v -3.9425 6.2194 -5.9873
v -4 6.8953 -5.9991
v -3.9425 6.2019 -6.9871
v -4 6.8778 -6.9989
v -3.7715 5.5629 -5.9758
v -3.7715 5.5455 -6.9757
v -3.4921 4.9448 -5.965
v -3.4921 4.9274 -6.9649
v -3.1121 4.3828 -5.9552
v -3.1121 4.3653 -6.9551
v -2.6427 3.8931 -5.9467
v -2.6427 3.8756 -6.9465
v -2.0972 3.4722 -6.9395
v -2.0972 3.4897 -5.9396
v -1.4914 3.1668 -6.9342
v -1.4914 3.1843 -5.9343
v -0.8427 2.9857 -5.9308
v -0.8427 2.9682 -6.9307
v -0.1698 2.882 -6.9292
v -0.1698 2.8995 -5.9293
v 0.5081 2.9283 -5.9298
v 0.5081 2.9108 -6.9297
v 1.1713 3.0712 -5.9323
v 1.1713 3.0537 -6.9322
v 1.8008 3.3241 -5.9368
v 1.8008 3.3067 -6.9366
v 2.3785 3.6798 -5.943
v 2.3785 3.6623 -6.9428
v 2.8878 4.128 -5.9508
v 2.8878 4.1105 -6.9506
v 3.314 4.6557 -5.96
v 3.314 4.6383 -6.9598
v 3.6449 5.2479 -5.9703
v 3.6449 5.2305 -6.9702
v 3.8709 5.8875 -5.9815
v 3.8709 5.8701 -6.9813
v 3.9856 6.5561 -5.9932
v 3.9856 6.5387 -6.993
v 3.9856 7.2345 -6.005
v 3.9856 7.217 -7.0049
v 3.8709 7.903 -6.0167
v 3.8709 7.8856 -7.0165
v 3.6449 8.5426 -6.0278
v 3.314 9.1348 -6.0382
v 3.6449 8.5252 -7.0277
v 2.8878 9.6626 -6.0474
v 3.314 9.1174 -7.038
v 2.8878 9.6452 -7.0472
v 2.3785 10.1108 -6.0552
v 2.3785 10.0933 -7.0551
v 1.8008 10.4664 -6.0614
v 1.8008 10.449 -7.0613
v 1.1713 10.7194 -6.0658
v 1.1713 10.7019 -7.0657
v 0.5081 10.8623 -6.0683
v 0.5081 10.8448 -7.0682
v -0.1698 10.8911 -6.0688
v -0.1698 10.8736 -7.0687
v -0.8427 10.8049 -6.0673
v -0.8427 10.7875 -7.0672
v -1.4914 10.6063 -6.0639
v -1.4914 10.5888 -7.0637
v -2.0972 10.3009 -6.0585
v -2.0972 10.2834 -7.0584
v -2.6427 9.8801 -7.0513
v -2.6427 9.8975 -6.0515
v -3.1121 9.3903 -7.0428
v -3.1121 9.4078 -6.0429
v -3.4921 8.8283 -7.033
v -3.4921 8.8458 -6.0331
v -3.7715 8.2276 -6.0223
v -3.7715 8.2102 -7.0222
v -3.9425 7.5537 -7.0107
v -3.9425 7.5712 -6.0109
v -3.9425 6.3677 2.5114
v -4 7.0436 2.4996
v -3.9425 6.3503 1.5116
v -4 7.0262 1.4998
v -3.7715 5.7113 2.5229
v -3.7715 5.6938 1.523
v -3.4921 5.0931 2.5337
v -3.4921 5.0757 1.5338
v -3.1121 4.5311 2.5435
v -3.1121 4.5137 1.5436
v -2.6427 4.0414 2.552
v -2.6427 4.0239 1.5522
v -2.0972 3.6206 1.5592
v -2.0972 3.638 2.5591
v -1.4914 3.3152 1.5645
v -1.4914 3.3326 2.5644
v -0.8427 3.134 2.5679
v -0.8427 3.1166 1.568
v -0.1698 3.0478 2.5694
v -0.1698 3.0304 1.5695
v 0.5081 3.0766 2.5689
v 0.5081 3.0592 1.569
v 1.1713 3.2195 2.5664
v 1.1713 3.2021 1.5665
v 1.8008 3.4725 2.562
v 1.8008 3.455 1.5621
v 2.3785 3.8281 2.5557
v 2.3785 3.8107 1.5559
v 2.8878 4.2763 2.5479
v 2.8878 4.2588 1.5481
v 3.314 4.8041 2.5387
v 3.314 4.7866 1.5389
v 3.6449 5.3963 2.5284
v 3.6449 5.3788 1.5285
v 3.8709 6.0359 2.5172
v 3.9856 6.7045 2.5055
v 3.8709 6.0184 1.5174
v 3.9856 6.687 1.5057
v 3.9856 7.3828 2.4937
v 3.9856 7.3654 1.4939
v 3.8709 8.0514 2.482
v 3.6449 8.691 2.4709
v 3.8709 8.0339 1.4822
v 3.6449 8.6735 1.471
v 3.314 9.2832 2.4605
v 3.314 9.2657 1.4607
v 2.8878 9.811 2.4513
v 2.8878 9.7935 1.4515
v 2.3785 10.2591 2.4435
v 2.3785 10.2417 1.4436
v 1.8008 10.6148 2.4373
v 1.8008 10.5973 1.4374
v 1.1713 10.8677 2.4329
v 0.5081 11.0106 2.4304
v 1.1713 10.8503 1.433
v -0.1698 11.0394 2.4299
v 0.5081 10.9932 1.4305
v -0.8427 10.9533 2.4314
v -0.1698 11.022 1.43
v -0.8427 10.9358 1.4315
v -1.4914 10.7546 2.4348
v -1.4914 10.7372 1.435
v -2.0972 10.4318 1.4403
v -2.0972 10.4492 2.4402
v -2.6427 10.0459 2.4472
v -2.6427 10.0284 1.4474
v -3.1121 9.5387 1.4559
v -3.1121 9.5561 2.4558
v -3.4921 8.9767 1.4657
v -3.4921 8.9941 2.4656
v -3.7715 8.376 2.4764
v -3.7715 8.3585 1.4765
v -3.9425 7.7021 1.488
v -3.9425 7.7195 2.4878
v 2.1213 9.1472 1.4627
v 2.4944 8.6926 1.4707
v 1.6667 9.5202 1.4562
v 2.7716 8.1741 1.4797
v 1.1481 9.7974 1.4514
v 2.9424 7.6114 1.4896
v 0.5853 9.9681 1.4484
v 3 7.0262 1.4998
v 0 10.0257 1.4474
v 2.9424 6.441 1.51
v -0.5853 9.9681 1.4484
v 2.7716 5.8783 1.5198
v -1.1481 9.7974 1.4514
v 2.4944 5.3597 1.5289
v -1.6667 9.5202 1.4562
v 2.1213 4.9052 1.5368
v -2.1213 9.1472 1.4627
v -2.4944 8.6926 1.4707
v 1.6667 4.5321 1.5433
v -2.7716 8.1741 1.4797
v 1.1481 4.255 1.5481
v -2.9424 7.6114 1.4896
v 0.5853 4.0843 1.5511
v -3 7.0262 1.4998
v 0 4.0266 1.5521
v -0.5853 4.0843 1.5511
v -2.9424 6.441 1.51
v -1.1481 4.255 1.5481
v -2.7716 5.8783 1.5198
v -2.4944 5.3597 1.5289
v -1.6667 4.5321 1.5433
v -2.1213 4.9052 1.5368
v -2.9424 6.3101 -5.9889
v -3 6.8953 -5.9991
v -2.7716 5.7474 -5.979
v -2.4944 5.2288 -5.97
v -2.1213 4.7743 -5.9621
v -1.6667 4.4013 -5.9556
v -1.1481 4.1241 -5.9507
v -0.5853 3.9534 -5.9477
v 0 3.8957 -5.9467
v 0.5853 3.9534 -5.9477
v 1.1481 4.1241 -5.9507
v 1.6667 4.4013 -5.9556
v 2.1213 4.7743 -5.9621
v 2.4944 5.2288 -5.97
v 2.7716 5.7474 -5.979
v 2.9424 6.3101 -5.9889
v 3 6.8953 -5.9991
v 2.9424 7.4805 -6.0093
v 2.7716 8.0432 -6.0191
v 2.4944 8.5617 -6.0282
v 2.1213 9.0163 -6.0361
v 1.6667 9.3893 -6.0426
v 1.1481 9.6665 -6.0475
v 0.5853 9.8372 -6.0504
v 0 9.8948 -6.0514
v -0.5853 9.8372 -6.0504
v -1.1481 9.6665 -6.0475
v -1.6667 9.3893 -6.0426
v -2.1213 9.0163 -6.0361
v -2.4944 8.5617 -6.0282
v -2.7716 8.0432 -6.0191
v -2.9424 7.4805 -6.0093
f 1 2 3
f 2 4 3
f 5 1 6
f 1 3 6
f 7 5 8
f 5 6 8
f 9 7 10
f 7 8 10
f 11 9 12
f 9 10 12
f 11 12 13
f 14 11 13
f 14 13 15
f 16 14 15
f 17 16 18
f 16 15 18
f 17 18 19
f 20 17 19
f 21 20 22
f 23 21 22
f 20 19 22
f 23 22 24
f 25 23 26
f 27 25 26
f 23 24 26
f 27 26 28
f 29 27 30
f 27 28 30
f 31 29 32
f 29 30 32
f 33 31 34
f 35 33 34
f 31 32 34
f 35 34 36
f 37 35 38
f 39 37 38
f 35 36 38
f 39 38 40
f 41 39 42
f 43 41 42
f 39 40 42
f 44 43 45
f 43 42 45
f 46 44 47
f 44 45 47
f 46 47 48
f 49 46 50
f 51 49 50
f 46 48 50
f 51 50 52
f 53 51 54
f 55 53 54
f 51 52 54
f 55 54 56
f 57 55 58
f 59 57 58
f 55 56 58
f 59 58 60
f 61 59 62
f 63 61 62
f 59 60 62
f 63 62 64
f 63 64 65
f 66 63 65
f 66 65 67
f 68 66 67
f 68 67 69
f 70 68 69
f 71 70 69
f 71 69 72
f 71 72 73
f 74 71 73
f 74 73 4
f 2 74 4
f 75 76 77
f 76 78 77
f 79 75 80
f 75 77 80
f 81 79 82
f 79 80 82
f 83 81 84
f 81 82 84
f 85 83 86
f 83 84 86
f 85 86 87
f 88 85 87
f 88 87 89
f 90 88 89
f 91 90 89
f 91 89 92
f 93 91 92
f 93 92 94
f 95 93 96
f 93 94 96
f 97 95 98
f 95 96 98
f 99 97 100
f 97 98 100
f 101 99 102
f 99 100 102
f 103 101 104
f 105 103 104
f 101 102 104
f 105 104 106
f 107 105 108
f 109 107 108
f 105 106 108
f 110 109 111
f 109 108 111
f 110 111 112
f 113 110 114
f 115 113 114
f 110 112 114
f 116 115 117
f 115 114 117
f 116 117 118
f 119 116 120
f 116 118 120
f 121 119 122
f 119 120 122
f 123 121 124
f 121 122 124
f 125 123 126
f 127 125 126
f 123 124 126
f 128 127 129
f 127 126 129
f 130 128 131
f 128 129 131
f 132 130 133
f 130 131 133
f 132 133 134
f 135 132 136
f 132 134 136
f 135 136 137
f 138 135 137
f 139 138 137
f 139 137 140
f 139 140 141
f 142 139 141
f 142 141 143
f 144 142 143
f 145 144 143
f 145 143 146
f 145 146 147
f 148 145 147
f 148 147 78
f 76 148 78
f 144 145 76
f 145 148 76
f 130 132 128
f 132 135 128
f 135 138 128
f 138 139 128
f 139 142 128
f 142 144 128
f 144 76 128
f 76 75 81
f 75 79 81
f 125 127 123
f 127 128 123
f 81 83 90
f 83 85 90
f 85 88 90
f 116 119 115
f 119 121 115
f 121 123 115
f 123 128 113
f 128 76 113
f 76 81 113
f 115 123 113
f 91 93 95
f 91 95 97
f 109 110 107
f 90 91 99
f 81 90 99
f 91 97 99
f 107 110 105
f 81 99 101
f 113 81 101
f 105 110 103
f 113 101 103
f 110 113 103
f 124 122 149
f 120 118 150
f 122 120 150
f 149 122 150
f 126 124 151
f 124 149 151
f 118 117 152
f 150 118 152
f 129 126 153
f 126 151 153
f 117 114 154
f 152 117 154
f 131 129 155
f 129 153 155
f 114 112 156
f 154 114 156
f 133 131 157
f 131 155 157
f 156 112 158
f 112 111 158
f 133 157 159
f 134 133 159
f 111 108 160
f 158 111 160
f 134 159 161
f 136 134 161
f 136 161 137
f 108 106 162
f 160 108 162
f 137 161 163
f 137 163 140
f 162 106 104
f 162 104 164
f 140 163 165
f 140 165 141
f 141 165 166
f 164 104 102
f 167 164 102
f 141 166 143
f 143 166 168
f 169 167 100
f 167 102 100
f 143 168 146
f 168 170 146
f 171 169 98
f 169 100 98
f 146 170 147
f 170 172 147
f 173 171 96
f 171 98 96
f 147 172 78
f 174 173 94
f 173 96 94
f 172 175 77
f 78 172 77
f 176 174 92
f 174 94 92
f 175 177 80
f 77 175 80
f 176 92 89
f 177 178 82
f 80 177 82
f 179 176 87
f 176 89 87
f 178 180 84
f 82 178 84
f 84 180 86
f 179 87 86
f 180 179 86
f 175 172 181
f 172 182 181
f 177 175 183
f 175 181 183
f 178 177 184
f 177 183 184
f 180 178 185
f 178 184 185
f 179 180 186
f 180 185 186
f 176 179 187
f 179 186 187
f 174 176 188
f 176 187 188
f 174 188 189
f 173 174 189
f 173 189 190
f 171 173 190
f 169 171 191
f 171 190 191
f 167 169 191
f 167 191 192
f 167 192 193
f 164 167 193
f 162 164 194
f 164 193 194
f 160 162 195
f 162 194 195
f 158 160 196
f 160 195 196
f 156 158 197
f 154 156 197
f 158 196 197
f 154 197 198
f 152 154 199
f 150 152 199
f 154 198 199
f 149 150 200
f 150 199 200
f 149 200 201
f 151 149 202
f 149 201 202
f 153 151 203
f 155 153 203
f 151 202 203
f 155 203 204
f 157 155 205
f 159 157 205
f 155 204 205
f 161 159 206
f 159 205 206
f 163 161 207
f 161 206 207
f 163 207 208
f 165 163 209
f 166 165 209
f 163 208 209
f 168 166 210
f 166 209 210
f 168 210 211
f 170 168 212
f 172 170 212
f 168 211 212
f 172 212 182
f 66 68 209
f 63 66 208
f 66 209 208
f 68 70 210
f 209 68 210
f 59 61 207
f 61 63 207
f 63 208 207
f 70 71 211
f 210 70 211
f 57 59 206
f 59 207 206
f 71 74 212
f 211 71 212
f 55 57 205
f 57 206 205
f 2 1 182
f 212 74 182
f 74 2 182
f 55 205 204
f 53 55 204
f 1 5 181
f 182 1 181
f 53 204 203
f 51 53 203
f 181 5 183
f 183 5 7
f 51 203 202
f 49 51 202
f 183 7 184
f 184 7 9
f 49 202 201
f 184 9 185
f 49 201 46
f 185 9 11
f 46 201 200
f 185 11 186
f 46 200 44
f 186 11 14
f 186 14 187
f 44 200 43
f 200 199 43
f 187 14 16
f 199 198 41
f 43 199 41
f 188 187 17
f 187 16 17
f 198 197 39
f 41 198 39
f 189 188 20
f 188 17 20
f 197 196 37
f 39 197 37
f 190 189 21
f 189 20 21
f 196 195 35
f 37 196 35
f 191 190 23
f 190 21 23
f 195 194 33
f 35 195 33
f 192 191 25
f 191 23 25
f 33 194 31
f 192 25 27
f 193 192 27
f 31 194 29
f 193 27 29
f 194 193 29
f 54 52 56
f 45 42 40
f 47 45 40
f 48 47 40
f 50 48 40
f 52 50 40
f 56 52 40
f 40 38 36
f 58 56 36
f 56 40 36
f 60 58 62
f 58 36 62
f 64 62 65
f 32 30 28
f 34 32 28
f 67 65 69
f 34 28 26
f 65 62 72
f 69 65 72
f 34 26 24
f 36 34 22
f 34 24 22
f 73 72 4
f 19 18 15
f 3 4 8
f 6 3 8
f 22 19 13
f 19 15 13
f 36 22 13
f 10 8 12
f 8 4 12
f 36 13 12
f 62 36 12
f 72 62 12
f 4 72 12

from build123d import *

# Parameters (mm, degrees)
BODY_MOVE_COPY1_ANGLE = 119.424338974


with BuildPart() as part:
    # Sketch1 → Revolve1 (revolve)
    with BuildSketch(Plane.XY, mode=Mode.PRIVATE) as revolve1_sk:
        Polygon((0, 0), (0, 9.5), (-4, 9.5), (-4, 8.5), (-3, 8.5), (-3, 1), (-4, 1), (-4, 0), align=None)
    revolve(revolve1_sk.sketch.rotate(Axis((0, 0, 0), (0, 1, 0)), 270), axis=Axis((0, 0, 0), (0, 1, 0)))


with BuildPart() as part_1:
    # Body-Move/Copy1: moved
    add(part.part.moved(Location((0, 0, 0))).rotate(Axis((-2.346629399, 4.612052575, -2.346629399), (0.5739619558891293, 0.5840679295973761, 0.5739619558888548)), BODY_MOVE_COPY1_ANGLE))


solid = part_1.part
